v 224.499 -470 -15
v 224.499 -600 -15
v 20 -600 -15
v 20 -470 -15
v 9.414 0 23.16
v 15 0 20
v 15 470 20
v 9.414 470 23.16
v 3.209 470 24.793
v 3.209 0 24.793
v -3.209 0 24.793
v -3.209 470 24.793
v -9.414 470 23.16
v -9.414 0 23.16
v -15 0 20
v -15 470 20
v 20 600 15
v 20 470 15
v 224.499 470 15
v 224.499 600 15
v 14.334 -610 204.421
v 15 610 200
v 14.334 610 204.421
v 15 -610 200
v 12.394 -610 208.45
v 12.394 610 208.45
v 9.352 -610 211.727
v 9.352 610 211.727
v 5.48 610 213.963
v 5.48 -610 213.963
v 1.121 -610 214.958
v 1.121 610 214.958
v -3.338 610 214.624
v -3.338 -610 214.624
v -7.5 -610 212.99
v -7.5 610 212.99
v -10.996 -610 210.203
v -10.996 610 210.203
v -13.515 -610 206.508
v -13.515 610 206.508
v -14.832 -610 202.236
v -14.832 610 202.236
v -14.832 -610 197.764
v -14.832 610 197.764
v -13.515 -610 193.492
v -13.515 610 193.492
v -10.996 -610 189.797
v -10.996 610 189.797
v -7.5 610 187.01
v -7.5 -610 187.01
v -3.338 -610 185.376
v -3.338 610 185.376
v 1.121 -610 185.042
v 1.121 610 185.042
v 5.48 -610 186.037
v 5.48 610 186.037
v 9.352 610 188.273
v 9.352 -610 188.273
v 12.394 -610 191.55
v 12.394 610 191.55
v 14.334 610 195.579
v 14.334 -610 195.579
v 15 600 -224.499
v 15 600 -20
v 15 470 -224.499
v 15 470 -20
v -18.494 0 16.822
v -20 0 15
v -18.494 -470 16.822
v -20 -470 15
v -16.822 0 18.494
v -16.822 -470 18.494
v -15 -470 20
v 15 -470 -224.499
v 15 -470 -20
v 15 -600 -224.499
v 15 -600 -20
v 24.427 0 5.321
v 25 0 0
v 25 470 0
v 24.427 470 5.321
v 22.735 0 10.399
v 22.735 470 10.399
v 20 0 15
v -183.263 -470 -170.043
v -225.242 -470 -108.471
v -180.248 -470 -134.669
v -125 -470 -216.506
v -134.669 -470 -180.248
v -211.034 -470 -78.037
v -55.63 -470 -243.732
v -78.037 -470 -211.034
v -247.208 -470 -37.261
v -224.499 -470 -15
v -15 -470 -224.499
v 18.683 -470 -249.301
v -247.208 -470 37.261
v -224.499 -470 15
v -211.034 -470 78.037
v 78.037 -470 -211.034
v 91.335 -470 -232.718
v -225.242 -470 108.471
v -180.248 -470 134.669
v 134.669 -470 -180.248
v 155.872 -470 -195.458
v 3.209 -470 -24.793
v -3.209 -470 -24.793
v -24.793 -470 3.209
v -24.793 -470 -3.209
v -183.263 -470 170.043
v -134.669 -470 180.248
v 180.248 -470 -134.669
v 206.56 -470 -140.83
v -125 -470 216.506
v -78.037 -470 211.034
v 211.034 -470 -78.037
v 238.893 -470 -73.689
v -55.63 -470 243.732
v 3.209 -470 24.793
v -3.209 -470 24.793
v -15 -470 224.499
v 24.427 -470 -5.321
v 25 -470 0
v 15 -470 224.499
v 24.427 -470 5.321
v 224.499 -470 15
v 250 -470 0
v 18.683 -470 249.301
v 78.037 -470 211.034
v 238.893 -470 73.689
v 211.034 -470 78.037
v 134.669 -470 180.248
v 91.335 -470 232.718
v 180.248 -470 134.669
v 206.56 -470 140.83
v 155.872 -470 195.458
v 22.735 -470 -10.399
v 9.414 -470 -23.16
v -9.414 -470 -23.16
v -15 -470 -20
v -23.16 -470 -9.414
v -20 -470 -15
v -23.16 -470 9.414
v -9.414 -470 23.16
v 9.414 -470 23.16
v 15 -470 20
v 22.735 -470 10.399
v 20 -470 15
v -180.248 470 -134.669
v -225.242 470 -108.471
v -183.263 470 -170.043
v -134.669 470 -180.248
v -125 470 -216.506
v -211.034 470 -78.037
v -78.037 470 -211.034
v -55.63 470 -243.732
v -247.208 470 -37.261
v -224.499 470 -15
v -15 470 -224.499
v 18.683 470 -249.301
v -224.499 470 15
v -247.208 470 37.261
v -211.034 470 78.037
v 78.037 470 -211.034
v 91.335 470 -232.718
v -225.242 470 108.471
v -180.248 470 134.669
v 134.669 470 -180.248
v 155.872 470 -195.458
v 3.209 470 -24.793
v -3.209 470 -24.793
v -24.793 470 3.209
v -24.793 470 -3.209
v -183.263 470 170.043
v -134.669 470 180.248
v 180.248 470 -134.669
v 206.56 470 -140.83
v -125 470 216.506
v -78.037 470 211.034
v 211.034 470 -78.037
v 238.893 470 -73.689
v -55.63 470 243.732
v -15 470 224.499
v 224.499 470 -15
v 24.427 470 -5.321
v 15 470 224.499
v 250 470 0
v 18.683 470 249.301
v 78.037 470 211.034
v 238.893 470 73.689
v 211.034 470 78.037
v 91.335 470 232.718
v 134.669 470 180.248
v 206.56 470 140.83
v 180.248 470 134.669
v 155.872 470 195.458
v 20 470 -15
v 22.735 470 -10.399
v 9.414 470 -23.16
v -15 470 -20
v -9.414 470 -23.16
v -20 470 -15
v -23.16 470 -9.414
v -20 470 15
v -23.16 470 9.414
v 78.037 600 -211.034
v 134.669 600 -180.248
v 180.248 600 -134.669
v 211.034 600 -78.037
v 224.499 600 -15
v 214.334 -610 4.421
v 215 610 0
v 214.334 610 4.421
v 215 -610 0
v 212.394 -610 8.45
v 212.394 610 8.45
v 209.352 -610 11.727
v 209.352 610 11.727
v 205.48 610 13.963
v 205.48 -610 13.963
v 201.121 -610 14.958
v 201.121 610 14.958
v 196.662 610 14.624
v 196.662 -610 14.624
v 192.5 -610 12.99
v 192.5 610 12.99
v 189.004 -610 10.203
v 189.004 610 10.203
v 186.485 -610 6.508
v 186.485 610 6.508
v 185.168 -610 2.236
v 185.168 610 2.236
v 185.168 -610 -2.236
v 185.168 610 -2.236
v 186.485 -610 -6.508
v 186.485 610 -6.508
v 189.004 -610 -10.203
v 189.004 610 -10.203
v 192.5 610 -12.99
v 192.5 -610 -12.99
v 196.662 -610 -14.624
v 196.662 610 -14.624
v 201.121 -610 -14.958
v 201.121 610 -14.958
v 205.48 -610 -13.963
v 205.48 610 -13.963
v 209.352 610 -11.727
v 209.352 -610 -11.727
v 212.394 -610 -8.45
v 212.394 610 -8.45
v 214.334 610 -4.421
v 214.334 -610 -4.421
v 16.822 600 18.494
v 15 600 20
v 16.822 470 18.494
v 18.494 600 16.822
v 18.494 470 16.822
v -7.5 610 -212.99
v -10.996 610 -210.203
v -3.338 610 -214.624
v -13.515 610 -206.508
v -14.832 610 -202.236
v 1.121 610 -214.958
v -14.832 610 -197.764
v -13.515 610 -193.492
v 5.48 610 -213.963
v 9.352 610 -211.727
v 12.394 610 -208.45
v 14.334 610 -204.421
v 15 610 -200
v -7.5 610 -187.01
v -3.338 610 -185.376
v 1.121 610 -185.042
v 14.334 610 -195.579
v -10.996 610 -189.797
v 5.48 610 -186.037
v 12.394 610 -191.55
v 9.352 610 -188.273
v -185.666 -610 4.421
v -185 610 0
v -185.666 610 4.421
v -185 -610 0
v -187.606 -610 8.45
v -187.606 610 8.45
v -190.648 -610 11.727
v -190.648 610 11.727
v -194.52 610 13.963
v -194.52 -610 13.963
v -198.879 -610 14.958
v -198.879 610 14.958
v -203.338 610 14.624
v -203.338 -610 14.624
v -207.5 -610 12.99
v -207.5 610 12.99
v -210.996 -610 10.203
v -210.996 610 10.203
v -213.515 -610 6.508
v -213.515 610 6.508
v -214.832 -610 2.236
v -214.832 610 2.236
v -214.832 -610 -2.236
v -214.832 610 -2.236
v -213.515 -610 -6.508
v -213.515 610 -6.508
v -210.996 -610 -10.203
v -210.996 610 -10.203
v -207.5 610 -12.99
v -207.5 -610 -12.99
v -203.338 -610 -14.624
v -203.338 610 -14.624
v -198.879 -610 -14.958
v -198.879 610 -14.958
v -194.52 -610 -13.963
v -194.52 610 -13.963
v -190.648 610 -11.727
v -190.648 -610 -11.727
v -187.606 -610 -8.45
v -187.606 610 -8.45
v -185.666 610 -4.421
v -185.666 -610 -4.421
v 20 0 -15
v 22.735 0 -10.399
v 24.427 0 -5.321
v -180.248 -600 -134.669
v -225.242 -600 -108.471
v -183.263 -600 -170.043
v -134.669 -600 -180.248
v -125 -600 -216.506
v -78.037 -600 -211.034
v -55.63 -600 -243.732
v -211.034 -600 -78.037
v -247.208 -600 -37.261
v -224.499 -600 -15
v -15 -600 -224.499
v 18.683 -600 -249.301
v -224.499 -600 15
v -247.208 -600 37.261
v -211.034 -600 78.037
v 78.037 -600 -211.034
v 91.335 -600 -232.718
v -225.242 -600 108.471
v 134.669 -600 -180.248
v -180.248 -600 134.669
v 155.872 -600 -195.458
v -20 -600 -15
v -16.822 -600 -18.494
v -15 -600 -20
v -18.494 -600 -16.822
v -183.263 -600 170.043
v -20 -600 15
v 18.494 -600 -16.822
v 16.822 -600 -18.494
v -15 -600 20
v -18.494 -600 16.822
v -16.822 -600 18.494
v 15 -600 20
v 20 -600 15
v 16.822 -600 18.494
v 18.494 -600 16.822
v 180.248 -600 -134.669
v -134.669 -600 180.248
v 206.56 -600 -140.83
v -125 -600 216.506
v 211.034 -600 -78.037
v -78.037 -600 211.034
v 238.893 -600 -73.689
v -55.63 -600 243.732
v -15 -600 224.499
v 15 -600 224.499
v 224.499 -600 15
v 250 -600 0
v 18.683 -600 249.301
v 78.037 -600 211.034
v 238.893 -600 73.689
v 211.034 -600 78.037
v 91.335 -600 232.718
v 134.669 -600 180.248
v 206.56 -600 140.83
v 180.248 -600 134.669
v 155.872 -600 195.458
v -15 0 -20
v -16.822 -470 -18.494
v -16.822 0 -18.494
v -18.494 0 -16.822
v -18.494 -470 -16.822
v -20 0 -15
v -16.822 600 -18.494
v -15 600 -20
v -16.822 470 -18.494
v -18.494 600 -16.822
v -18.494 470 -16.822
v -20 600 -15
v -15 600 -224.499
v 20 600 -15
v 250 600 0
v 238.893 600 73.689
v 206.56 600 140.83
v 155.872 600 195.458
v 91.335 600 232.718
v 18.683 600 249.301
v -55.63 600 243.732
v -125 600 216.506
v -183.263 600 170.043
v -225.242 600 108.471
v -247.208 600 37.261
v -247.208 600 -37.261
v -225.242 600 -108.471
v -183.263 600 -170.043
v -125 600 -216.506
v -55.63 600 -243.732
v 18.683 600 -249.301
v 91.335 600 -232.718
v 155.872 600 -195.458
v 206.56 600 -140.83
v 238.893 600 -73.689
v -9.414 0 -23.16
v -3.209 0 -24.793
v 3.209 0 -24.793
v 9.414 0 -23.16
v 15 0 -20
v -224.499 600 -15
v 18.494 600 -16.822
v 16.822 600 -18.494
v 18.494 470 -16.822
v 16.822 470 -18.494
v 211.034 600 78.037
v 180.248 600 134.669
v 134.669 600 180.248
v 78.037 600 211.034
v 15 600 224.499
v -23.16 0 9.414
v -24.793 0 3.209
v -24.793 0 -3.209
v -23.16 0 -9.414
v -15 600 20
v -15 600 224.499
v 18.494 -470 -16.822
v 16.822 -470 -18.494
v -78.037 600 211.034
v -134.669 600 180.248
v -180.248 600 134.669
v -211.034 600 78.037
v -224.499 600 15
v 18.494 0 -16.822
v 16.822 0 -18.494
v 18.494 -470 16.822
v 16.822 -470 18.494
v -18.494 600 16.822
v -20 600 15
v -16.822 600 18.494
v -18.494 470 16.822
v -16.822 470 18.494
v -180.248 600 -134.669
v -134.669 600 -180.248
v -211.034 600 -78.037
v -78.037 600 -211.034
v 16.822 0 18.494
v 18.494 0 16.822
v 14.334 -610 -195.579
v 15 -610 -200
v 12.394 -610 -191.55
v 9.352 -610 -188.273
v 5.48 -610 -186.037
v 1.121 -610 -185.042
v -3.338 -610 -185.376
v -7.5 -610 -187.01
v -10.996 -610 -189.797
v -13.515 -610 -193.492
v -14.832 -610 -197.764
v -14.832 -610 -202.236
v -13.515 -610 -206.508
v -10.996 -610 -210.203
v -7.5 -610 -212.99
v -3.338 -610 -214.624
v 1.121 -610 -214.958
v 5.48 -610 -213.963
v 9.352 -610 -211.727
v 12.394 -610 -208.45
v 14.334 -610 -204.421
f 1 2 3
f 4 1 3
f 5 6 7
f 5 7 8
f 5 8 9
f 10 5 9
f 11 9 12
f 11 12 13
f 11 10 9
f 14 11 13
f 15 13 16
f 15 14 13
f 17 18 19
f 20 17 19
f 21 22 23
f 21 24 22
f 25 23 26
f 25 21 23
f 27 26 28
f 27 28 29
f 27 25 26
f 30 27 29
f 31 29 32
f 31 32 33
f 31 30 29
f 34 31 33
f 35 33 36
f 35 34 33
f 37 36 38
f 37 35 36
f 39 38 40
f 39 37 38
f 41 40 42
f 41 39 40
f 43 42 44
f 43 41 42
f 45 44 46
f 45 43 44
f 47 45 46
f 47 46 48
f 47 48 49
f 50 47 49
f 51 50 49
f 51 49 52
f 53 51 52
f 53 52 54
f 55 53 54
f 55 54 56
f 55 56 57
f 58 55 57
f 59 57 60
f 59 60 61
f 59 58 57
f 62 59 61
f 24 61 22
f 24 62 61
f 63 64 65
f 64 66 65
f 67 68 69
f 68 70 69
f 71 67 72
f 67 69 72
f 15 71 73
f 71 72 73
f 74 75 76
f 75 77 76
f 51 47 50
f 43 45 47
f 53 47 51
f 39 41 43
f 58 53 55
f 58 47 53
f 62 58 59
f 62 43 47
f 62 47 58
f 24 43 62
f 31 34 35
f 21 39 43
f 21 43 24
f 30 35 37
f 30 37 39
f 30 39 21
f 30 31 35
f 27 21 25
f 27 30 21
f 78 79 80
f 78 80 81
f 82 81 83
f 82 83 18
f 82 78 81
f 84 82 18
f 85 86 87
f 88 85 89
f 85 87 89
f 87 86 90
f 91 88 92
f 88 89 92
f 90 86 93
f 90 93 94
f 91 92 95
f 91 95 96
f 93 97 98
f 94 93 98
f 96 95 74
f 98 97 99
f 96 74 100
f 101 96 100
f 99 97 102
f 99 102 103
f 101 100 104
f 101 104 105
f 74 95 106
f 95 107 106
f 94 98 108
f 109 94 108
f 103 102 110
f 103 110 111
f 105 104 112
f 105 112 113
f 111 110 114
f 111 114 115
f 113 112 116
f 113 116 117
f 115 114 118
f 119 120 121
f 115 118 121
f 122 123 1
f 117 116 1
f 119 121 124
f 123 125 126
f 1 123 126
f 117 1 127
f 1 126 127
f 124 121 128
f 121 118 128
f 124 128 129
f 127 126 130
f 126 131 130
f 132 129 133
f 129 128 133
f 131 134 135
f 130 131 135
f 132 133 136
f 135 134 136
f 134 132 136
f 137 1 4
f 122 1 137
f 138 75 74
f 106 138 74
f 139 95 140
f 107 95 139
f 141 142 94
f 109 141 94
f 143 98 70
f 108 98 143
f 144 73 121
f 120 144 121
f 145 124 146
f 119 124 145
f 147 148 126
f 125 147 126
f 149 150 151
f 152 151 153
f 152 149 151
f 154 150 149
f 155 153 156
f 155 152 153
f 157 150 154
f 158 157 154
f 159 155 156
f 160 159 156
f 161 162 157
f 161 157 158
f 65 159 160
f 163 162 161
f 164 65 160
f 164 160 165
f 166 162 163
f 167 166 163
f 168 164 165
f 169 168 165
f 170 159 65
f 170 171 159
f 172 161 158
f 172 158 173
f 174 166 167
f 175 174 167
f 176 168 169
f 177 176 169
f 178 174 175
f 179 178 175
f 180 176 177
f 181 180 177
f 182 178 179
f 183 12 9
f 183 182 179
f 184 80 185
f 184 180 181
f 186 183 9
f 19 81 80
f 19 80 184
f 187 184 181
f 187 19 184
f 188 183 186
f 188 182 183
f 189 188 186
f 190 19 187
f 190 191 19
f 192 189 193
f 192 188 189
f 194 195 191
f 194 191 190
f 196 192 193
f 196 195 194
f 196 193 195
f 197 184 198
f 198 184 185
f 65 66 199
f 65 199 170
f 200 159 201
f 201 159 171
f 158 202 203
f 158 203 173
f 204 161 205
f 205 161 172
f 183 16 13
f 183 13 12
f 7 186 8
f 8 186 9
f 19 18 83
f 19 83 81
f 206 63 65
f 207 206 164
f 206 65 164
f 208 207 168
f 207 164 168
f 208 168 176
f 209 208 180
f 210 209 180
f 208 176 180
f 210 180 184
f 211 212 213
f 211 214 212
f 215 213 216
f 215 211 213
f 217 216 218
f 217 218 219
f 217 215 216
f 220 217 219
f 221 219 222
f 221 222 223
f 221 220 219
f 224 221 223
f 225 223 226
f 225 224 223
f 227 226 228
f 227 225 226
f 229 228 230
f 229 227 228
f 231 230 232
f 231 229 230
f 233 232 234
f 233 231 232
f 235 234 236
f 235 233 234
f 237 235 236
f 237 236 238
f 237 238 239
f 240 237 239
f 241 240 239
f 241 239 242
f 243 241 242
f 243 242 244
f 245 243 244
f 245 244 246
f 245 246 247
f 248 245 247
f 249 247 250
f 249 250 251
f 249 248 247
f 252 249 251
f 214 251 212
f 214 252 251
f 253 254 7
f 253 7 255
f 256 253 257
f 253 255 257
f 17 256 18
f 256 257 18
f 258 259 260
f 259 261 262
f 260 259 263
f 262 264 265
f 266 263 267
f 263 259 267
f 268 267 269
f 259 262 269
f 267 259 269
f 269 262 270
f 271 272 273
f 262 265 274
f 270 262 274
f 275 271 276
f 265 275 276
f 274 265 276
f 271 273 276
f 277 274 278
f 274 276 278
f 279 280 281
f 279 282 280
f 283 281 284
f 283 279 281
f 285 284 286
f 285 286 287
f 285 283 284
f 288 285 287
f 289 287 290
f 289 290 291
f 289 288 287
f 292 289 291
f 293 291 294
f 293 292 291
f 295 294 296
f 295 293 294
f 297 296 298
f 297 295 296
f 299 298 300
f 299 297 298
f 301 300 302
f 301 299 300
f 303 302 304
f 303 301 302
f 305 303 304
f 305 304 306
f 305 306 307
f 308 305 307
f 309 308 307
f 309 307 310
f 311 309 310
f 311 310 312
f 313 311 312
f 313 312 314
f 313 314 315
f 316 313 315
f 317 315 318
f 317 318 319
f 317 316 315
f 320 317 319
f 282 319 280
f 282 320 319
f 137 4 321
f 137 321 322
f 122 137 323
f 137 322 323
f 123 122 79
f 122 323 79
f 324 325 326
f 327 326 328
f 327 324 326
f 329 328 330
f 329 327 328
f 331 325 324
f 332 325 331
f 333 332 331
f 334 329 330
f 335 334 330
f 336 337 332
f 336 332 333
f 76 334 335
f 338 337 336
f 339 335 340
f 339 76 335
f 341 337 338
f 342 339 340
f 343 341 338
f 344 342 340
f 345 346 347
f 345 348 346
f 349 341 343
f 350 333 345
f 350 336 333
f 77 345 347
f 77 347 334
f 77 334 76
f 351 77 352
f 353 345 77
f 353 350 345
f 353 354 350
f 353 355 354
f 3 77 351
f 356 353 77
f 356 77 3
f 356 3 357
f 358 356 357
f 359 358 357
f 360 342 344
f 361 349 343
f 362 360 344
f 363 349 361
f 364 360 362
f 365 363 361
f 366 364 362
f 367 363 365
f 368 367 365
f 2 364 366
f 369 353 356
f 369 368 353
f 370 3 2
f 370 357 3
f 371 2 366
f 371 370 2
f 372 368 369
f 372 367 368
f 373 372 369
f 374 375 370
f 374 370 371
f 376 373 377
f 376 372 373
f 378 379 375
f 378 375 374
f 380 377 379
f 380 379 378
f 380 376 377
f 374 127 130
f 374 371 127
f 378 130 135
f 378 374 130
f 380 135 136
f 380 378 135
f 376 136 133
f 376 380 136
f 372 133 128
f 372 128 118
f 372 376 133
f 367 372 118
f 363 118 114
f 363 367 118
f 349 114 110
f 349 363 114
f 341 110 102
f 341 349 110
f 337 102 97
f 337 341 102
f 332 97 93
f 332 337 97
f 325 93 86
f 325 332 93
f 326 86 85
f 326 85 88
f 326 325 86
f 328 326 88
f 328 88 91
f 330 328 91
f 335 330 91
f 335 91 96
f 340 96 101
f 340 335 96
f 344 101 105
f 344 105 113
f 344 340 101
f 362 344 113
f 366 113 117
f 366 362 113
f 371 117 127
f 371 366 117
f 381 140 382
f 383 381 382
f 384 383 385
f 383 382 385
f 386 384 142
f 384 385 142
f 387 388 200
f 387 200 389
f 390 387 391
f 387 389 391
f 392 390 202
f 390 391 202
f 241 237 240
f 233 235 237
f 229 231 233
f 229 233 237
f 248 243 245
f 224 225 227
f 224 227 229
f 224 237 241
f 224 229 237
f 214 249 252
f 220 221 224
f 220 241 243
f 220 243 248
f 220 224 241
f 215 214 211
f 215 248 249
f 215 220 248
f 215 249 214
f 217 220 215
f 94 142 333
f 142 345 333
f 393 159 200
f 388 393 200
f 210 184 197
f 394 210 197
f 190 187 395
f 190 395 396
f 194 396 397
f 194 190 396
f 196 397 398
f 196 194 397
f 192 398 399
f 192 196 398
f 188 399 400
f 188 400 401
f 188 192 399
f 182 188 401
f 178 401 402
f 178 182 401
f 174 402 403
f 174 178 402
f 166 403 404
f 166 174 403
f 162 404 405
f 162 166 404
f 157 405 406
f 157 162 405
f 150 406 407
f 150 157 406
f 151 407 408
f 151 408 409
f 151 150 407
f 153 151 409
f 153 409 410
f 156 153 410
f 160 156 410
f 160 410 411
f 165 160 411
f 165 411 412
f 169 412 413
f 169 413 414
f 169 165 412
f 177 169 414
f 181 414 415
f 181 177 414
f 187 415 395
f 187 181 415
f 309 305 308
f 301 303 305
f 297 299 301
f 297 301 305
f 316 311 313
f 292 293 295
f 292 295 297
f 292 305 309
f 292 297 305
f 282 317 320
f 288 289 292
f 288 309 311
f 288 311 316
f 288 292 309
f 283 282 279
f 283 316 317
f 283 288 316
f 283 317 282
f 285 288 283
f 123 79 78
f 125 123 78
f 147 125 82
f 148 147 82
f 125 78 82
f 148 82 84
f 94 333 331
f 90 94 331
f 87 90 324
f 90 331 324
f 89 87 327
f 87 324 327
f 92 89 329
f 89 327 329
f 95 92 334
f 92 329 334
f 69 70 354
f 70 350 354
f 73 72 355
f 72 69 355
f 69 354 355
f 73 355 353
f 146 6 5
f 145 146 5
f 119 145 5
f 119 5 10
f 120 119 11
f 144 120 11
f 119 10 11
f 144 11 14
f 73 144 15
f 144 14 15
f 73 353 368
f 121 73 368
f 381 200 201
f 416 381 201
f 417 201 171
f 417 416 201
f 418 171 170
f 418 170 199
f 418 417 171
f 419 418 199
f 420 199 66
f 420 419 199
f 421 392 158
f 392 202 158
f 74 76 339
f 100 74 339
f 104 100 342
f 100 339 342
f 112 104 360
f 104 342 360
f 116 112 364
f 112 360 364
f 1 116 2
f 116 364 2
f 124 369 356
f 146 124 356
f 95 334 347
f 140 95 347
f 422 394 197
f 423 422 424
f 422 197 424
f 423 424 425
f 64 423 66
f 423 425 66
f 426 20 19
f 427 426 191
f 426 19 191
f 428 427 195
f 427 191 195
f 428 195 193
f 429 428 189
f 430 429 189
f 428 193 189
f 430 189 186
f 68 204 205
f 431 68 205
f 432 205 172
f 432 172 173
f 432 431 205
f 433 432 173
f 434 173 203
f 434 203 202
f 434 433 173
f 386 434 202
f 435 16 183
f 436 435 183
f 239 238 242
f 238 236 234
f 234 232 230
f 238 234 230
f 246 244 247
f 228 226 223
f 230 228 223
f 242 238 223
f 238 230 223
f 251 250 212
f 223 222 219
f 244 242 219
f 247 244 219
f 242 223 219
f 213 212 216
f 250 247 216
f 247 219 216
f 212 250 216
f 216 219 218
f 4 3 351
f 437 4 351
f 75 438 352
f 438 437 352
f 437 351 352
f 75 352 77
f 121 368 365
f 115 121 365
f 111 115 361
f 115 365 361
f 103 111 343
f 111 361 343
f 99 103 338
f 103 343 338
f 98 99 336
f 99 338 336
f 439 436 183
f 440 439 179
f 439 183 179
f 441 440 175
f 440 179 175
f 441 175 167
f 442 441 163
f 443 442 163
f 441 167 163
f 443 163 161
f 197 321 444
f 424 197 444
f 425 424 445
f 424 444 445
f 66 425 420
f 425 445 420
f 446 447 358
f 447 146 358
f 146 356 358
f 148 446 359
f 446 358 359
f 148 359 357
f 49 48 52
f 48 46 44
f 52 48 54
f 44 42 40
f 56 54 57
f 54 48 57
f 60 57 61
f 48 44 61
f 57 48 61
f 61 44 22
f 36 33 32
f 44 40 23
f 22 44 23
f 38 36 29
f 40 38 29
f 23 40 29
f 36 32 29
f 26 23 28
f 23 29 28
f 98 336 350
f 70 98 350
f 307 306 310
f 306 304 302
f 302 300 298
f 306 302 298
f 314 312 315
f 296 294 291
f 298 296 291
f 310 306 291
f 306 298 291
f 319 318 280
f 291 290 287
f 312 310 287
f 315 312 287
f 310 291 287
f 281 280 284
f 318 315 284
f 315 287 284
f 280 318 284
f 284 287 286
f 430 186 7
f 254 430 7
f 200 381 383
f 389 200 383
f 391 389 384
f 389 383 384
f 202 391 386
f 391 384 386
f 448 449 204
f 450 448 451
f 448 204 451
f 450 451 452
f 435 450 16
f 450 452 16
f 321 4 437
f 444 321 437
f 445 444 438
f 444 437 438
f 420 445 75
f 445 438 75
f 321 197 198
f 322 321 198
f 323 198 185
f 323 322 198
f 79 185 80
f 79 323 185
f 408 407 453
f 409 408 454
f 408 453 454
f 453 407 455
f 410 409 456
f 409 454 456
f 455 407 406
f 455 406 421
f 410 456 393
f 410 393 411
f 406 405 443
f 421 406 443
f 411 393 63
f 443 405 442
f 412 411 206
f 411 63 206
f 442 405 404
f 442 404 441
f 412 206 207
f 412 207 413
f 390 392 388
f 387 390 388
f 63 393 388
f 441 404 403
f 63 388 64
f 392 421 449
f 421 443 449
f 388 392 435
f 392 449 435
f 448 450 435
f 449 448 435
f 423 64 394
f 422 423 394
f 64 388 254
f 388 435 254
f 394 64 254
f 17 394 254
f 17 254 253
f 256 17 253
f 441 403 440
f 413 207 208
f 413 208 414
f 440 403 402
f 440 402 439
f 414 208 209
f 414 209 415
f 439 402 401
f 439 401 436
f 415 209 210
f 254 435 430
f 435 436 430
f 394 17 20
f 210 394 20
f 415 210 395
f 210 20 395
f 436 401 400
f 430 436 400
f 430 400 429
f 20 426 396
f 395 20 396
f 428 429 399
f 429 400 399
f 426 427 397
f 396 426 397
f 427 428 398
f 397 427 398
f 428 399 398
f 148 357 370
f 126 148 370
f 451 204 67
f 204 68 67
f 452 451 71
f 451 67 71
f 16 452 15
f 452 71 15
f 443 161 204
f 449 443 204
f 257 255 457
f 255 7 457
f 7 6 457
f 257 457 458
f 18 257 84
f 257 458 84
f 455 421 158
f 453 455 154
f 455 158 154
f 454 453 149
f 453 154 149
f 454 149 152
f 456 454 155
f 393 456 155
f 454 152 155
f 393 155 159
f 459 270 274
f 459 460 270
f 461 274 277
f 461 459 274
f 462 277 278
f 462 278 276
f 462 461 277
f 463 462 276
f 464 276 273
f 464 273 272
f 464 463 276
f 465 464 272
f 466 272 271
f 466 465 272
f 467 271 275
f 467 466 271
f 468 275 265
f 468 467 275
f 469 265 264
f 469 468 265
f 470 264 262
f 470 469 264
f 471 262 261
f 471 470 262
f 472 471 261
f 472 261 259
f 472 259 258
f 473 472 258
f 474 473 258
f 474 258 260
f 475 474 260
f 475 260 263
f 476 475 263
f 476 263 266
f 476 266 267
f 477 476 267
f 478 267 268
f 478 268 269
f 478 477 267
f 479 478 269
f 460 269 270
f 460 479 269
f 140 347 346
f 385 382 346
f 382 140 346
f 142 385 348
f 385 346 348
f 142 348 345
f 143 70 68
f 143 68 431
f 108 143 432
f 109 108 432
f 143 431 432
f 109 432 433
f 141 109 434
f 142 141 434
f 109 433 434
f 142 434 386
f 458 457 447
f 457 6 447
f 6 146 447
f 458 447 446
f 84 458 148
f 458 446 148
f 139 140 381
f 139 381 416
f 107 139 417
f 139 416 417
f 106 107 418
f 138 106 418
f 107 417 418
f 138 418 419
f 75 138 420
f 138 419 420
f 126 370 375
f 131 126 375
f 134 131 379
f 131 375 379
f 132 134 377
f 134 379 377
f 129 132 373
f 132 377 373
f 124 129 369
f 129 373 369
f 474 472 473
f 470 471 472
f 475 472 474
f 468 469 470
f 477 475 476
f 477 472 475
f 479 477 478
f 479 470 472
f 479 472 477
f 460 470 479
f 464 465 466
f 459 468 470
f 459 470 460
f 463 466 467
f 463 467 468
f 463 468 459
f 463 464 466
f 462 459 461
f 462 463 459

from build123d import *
from build123d import SkipClean  # not in build123d's __all__

# Parameters (mm, degrees)
F0_R          = 250
F1_DEPTH      = 600
F1_DEPTH_BACK = 600
F3_DEPTH      = 600.001
F3_DEPTH_BACK = 600.001
F4_R          = 250
F4_R_2        = 25
F5_DEPTH      = 470
F5_DEPTH_BACK = 470
F6_R          = 15
F7_DEPTH      = 610
F7_DEPTH_BACK = 610


with BuildPart() as f1:
    # F0 (on Front) → F1 (new body, two sides)
    with BuildSketch(Plane.XZ) as f1_sk:
        Circle(F0_R)
    extrude(amount=F1_DEPTH)
    extrude(f1_sk.sketch, amount=-F1_DEPTH_BACK)

    # F2 (on Front) → F3 (cut, two sides)
    with BuildSketch(Plane.XZ) as f3_sk:
        with BuildLine():
            Line((20, 15), (224.4994432064, 15))
            ThreePointArc((224.4994432064, 15), (159.099025767, 159.099025767), (15, 224.4994432064))
            Line((15, 224.4994432064), (15, 20))
            ThreePointArc((15, 20), (17.6776695297, 17.6776695297), (20, 15))
        make_face()
        with BuildLine():
            Line((-15, 20), (-15, 224.4994432064))
            ThreePointArc((-15, 224.4994432064), (-159.099025767, 159.099025767), (-224.4994432064, 15))
            Line((-224.4994432064, 15), (-20, 15))
            ThreePointArc((-20, 15), (-17.6776695297, 17.6776695297), (-15, 20))
        make_face()
        with BuildLine():
            ThreePointArc((-224.4994432064, -15), (-159.099025767, -159.099025767), (-15, -224.4994432064))
            Line((-15, -224.4994432064), (-15, -20))
            ThreePointArc((-15, -20), (-17.6776695297, -17.6776695297), (-20, -15))
            Line((-20, -15), (-224.4994432064, -15))
        make_face()
        with BuildLine():
            ThreePointArc((15, -224.4994432064), (159.099025767, -159.099025767), (224.4994432064, -15))
            Line((224.4994432064, -15), (20, -15))
            ThreePointArc((20, -15), (17.6776695297, -17.6776695297), (15, -20))
            Line((15, -20), (15, -224.4994432064))
        make_face()
    extrude(amount=F3_DEPTH, mode=Mode.SUBTRACT)
    extrude(f3_sk.sketch, amount=-F3_DEPTH_BACK, mode=Mode.SUBTRACT)

    # F4 (on Front) → F5 (cut, two sides)
    with BuildSketch(Plane.XZ) as f5_sk:
        Circle(F4_R)
        Circle(F4_R_2, mode=Mode.SUBTRACT)
    with SkipClean():  # cleaning this boolean's faces spoils the solid; the shape is the same uncleaned
        extrude(amount=-F5_DEPTH, mode=Mode.SUBTRACT)
        extrude(f5_sk.sketch, amount=F5_DEPTH_BACK, mode=Mode.SUBTRACT)


with BuildPart() as f7:
    # F6 (on Front) → F7 (new body, two sides)
    with BuildSketch(Plane.XZ) as f7_sk:
        with Locations((0, 200)):
            Circle(F6_R)
    extrude(amount=F7_DEPTH)
    extrude(f7_sk.sketch, amount=-F7_DEPTH_BACK)


with BuildPart() as f7b:
    # F6 (on Front) → F7, piece 2 (new body, two sides)
    with BuildSketch(Plane.XZ) as f7_2_sk:
        with Locations((-200, 0)):
            Circle(F6_R)
    extrude(amount=F7_DEPTH)
    extrude(f7_2_sk.sketch, amount=-F7_DEPTH_BACK)


with BuildPart() as f7c:
    # F6 (on Front) → F7, piece 3 (new body, two sides)
    with BuildSketch(Plane.XZ) as f7_3_sk:
        with Locations((0, -200)):
            Circle(F6_R)
    extrude(amount=F7_DEPTH)
    extrude(f7_3_sk.sketch, amount=-F7_DEPTH_BACK)


with BuildPart() as f7d:
    # F6 (on Front) → F7, piece 4 (new body, two sides)
    with BuildSketch(Plane.XZ) as f7_4_sk:
        with Locations((200, 0)):
            Circle(F6_R)
    extrude(amount=F7_DEPTH)
    extrude(f7_4_sk.sketch, amount=-F7_DEPTH_BACK)


solid = Compound([f1.part, f7.part, f7b.part, f7c.part, f7d.part])
